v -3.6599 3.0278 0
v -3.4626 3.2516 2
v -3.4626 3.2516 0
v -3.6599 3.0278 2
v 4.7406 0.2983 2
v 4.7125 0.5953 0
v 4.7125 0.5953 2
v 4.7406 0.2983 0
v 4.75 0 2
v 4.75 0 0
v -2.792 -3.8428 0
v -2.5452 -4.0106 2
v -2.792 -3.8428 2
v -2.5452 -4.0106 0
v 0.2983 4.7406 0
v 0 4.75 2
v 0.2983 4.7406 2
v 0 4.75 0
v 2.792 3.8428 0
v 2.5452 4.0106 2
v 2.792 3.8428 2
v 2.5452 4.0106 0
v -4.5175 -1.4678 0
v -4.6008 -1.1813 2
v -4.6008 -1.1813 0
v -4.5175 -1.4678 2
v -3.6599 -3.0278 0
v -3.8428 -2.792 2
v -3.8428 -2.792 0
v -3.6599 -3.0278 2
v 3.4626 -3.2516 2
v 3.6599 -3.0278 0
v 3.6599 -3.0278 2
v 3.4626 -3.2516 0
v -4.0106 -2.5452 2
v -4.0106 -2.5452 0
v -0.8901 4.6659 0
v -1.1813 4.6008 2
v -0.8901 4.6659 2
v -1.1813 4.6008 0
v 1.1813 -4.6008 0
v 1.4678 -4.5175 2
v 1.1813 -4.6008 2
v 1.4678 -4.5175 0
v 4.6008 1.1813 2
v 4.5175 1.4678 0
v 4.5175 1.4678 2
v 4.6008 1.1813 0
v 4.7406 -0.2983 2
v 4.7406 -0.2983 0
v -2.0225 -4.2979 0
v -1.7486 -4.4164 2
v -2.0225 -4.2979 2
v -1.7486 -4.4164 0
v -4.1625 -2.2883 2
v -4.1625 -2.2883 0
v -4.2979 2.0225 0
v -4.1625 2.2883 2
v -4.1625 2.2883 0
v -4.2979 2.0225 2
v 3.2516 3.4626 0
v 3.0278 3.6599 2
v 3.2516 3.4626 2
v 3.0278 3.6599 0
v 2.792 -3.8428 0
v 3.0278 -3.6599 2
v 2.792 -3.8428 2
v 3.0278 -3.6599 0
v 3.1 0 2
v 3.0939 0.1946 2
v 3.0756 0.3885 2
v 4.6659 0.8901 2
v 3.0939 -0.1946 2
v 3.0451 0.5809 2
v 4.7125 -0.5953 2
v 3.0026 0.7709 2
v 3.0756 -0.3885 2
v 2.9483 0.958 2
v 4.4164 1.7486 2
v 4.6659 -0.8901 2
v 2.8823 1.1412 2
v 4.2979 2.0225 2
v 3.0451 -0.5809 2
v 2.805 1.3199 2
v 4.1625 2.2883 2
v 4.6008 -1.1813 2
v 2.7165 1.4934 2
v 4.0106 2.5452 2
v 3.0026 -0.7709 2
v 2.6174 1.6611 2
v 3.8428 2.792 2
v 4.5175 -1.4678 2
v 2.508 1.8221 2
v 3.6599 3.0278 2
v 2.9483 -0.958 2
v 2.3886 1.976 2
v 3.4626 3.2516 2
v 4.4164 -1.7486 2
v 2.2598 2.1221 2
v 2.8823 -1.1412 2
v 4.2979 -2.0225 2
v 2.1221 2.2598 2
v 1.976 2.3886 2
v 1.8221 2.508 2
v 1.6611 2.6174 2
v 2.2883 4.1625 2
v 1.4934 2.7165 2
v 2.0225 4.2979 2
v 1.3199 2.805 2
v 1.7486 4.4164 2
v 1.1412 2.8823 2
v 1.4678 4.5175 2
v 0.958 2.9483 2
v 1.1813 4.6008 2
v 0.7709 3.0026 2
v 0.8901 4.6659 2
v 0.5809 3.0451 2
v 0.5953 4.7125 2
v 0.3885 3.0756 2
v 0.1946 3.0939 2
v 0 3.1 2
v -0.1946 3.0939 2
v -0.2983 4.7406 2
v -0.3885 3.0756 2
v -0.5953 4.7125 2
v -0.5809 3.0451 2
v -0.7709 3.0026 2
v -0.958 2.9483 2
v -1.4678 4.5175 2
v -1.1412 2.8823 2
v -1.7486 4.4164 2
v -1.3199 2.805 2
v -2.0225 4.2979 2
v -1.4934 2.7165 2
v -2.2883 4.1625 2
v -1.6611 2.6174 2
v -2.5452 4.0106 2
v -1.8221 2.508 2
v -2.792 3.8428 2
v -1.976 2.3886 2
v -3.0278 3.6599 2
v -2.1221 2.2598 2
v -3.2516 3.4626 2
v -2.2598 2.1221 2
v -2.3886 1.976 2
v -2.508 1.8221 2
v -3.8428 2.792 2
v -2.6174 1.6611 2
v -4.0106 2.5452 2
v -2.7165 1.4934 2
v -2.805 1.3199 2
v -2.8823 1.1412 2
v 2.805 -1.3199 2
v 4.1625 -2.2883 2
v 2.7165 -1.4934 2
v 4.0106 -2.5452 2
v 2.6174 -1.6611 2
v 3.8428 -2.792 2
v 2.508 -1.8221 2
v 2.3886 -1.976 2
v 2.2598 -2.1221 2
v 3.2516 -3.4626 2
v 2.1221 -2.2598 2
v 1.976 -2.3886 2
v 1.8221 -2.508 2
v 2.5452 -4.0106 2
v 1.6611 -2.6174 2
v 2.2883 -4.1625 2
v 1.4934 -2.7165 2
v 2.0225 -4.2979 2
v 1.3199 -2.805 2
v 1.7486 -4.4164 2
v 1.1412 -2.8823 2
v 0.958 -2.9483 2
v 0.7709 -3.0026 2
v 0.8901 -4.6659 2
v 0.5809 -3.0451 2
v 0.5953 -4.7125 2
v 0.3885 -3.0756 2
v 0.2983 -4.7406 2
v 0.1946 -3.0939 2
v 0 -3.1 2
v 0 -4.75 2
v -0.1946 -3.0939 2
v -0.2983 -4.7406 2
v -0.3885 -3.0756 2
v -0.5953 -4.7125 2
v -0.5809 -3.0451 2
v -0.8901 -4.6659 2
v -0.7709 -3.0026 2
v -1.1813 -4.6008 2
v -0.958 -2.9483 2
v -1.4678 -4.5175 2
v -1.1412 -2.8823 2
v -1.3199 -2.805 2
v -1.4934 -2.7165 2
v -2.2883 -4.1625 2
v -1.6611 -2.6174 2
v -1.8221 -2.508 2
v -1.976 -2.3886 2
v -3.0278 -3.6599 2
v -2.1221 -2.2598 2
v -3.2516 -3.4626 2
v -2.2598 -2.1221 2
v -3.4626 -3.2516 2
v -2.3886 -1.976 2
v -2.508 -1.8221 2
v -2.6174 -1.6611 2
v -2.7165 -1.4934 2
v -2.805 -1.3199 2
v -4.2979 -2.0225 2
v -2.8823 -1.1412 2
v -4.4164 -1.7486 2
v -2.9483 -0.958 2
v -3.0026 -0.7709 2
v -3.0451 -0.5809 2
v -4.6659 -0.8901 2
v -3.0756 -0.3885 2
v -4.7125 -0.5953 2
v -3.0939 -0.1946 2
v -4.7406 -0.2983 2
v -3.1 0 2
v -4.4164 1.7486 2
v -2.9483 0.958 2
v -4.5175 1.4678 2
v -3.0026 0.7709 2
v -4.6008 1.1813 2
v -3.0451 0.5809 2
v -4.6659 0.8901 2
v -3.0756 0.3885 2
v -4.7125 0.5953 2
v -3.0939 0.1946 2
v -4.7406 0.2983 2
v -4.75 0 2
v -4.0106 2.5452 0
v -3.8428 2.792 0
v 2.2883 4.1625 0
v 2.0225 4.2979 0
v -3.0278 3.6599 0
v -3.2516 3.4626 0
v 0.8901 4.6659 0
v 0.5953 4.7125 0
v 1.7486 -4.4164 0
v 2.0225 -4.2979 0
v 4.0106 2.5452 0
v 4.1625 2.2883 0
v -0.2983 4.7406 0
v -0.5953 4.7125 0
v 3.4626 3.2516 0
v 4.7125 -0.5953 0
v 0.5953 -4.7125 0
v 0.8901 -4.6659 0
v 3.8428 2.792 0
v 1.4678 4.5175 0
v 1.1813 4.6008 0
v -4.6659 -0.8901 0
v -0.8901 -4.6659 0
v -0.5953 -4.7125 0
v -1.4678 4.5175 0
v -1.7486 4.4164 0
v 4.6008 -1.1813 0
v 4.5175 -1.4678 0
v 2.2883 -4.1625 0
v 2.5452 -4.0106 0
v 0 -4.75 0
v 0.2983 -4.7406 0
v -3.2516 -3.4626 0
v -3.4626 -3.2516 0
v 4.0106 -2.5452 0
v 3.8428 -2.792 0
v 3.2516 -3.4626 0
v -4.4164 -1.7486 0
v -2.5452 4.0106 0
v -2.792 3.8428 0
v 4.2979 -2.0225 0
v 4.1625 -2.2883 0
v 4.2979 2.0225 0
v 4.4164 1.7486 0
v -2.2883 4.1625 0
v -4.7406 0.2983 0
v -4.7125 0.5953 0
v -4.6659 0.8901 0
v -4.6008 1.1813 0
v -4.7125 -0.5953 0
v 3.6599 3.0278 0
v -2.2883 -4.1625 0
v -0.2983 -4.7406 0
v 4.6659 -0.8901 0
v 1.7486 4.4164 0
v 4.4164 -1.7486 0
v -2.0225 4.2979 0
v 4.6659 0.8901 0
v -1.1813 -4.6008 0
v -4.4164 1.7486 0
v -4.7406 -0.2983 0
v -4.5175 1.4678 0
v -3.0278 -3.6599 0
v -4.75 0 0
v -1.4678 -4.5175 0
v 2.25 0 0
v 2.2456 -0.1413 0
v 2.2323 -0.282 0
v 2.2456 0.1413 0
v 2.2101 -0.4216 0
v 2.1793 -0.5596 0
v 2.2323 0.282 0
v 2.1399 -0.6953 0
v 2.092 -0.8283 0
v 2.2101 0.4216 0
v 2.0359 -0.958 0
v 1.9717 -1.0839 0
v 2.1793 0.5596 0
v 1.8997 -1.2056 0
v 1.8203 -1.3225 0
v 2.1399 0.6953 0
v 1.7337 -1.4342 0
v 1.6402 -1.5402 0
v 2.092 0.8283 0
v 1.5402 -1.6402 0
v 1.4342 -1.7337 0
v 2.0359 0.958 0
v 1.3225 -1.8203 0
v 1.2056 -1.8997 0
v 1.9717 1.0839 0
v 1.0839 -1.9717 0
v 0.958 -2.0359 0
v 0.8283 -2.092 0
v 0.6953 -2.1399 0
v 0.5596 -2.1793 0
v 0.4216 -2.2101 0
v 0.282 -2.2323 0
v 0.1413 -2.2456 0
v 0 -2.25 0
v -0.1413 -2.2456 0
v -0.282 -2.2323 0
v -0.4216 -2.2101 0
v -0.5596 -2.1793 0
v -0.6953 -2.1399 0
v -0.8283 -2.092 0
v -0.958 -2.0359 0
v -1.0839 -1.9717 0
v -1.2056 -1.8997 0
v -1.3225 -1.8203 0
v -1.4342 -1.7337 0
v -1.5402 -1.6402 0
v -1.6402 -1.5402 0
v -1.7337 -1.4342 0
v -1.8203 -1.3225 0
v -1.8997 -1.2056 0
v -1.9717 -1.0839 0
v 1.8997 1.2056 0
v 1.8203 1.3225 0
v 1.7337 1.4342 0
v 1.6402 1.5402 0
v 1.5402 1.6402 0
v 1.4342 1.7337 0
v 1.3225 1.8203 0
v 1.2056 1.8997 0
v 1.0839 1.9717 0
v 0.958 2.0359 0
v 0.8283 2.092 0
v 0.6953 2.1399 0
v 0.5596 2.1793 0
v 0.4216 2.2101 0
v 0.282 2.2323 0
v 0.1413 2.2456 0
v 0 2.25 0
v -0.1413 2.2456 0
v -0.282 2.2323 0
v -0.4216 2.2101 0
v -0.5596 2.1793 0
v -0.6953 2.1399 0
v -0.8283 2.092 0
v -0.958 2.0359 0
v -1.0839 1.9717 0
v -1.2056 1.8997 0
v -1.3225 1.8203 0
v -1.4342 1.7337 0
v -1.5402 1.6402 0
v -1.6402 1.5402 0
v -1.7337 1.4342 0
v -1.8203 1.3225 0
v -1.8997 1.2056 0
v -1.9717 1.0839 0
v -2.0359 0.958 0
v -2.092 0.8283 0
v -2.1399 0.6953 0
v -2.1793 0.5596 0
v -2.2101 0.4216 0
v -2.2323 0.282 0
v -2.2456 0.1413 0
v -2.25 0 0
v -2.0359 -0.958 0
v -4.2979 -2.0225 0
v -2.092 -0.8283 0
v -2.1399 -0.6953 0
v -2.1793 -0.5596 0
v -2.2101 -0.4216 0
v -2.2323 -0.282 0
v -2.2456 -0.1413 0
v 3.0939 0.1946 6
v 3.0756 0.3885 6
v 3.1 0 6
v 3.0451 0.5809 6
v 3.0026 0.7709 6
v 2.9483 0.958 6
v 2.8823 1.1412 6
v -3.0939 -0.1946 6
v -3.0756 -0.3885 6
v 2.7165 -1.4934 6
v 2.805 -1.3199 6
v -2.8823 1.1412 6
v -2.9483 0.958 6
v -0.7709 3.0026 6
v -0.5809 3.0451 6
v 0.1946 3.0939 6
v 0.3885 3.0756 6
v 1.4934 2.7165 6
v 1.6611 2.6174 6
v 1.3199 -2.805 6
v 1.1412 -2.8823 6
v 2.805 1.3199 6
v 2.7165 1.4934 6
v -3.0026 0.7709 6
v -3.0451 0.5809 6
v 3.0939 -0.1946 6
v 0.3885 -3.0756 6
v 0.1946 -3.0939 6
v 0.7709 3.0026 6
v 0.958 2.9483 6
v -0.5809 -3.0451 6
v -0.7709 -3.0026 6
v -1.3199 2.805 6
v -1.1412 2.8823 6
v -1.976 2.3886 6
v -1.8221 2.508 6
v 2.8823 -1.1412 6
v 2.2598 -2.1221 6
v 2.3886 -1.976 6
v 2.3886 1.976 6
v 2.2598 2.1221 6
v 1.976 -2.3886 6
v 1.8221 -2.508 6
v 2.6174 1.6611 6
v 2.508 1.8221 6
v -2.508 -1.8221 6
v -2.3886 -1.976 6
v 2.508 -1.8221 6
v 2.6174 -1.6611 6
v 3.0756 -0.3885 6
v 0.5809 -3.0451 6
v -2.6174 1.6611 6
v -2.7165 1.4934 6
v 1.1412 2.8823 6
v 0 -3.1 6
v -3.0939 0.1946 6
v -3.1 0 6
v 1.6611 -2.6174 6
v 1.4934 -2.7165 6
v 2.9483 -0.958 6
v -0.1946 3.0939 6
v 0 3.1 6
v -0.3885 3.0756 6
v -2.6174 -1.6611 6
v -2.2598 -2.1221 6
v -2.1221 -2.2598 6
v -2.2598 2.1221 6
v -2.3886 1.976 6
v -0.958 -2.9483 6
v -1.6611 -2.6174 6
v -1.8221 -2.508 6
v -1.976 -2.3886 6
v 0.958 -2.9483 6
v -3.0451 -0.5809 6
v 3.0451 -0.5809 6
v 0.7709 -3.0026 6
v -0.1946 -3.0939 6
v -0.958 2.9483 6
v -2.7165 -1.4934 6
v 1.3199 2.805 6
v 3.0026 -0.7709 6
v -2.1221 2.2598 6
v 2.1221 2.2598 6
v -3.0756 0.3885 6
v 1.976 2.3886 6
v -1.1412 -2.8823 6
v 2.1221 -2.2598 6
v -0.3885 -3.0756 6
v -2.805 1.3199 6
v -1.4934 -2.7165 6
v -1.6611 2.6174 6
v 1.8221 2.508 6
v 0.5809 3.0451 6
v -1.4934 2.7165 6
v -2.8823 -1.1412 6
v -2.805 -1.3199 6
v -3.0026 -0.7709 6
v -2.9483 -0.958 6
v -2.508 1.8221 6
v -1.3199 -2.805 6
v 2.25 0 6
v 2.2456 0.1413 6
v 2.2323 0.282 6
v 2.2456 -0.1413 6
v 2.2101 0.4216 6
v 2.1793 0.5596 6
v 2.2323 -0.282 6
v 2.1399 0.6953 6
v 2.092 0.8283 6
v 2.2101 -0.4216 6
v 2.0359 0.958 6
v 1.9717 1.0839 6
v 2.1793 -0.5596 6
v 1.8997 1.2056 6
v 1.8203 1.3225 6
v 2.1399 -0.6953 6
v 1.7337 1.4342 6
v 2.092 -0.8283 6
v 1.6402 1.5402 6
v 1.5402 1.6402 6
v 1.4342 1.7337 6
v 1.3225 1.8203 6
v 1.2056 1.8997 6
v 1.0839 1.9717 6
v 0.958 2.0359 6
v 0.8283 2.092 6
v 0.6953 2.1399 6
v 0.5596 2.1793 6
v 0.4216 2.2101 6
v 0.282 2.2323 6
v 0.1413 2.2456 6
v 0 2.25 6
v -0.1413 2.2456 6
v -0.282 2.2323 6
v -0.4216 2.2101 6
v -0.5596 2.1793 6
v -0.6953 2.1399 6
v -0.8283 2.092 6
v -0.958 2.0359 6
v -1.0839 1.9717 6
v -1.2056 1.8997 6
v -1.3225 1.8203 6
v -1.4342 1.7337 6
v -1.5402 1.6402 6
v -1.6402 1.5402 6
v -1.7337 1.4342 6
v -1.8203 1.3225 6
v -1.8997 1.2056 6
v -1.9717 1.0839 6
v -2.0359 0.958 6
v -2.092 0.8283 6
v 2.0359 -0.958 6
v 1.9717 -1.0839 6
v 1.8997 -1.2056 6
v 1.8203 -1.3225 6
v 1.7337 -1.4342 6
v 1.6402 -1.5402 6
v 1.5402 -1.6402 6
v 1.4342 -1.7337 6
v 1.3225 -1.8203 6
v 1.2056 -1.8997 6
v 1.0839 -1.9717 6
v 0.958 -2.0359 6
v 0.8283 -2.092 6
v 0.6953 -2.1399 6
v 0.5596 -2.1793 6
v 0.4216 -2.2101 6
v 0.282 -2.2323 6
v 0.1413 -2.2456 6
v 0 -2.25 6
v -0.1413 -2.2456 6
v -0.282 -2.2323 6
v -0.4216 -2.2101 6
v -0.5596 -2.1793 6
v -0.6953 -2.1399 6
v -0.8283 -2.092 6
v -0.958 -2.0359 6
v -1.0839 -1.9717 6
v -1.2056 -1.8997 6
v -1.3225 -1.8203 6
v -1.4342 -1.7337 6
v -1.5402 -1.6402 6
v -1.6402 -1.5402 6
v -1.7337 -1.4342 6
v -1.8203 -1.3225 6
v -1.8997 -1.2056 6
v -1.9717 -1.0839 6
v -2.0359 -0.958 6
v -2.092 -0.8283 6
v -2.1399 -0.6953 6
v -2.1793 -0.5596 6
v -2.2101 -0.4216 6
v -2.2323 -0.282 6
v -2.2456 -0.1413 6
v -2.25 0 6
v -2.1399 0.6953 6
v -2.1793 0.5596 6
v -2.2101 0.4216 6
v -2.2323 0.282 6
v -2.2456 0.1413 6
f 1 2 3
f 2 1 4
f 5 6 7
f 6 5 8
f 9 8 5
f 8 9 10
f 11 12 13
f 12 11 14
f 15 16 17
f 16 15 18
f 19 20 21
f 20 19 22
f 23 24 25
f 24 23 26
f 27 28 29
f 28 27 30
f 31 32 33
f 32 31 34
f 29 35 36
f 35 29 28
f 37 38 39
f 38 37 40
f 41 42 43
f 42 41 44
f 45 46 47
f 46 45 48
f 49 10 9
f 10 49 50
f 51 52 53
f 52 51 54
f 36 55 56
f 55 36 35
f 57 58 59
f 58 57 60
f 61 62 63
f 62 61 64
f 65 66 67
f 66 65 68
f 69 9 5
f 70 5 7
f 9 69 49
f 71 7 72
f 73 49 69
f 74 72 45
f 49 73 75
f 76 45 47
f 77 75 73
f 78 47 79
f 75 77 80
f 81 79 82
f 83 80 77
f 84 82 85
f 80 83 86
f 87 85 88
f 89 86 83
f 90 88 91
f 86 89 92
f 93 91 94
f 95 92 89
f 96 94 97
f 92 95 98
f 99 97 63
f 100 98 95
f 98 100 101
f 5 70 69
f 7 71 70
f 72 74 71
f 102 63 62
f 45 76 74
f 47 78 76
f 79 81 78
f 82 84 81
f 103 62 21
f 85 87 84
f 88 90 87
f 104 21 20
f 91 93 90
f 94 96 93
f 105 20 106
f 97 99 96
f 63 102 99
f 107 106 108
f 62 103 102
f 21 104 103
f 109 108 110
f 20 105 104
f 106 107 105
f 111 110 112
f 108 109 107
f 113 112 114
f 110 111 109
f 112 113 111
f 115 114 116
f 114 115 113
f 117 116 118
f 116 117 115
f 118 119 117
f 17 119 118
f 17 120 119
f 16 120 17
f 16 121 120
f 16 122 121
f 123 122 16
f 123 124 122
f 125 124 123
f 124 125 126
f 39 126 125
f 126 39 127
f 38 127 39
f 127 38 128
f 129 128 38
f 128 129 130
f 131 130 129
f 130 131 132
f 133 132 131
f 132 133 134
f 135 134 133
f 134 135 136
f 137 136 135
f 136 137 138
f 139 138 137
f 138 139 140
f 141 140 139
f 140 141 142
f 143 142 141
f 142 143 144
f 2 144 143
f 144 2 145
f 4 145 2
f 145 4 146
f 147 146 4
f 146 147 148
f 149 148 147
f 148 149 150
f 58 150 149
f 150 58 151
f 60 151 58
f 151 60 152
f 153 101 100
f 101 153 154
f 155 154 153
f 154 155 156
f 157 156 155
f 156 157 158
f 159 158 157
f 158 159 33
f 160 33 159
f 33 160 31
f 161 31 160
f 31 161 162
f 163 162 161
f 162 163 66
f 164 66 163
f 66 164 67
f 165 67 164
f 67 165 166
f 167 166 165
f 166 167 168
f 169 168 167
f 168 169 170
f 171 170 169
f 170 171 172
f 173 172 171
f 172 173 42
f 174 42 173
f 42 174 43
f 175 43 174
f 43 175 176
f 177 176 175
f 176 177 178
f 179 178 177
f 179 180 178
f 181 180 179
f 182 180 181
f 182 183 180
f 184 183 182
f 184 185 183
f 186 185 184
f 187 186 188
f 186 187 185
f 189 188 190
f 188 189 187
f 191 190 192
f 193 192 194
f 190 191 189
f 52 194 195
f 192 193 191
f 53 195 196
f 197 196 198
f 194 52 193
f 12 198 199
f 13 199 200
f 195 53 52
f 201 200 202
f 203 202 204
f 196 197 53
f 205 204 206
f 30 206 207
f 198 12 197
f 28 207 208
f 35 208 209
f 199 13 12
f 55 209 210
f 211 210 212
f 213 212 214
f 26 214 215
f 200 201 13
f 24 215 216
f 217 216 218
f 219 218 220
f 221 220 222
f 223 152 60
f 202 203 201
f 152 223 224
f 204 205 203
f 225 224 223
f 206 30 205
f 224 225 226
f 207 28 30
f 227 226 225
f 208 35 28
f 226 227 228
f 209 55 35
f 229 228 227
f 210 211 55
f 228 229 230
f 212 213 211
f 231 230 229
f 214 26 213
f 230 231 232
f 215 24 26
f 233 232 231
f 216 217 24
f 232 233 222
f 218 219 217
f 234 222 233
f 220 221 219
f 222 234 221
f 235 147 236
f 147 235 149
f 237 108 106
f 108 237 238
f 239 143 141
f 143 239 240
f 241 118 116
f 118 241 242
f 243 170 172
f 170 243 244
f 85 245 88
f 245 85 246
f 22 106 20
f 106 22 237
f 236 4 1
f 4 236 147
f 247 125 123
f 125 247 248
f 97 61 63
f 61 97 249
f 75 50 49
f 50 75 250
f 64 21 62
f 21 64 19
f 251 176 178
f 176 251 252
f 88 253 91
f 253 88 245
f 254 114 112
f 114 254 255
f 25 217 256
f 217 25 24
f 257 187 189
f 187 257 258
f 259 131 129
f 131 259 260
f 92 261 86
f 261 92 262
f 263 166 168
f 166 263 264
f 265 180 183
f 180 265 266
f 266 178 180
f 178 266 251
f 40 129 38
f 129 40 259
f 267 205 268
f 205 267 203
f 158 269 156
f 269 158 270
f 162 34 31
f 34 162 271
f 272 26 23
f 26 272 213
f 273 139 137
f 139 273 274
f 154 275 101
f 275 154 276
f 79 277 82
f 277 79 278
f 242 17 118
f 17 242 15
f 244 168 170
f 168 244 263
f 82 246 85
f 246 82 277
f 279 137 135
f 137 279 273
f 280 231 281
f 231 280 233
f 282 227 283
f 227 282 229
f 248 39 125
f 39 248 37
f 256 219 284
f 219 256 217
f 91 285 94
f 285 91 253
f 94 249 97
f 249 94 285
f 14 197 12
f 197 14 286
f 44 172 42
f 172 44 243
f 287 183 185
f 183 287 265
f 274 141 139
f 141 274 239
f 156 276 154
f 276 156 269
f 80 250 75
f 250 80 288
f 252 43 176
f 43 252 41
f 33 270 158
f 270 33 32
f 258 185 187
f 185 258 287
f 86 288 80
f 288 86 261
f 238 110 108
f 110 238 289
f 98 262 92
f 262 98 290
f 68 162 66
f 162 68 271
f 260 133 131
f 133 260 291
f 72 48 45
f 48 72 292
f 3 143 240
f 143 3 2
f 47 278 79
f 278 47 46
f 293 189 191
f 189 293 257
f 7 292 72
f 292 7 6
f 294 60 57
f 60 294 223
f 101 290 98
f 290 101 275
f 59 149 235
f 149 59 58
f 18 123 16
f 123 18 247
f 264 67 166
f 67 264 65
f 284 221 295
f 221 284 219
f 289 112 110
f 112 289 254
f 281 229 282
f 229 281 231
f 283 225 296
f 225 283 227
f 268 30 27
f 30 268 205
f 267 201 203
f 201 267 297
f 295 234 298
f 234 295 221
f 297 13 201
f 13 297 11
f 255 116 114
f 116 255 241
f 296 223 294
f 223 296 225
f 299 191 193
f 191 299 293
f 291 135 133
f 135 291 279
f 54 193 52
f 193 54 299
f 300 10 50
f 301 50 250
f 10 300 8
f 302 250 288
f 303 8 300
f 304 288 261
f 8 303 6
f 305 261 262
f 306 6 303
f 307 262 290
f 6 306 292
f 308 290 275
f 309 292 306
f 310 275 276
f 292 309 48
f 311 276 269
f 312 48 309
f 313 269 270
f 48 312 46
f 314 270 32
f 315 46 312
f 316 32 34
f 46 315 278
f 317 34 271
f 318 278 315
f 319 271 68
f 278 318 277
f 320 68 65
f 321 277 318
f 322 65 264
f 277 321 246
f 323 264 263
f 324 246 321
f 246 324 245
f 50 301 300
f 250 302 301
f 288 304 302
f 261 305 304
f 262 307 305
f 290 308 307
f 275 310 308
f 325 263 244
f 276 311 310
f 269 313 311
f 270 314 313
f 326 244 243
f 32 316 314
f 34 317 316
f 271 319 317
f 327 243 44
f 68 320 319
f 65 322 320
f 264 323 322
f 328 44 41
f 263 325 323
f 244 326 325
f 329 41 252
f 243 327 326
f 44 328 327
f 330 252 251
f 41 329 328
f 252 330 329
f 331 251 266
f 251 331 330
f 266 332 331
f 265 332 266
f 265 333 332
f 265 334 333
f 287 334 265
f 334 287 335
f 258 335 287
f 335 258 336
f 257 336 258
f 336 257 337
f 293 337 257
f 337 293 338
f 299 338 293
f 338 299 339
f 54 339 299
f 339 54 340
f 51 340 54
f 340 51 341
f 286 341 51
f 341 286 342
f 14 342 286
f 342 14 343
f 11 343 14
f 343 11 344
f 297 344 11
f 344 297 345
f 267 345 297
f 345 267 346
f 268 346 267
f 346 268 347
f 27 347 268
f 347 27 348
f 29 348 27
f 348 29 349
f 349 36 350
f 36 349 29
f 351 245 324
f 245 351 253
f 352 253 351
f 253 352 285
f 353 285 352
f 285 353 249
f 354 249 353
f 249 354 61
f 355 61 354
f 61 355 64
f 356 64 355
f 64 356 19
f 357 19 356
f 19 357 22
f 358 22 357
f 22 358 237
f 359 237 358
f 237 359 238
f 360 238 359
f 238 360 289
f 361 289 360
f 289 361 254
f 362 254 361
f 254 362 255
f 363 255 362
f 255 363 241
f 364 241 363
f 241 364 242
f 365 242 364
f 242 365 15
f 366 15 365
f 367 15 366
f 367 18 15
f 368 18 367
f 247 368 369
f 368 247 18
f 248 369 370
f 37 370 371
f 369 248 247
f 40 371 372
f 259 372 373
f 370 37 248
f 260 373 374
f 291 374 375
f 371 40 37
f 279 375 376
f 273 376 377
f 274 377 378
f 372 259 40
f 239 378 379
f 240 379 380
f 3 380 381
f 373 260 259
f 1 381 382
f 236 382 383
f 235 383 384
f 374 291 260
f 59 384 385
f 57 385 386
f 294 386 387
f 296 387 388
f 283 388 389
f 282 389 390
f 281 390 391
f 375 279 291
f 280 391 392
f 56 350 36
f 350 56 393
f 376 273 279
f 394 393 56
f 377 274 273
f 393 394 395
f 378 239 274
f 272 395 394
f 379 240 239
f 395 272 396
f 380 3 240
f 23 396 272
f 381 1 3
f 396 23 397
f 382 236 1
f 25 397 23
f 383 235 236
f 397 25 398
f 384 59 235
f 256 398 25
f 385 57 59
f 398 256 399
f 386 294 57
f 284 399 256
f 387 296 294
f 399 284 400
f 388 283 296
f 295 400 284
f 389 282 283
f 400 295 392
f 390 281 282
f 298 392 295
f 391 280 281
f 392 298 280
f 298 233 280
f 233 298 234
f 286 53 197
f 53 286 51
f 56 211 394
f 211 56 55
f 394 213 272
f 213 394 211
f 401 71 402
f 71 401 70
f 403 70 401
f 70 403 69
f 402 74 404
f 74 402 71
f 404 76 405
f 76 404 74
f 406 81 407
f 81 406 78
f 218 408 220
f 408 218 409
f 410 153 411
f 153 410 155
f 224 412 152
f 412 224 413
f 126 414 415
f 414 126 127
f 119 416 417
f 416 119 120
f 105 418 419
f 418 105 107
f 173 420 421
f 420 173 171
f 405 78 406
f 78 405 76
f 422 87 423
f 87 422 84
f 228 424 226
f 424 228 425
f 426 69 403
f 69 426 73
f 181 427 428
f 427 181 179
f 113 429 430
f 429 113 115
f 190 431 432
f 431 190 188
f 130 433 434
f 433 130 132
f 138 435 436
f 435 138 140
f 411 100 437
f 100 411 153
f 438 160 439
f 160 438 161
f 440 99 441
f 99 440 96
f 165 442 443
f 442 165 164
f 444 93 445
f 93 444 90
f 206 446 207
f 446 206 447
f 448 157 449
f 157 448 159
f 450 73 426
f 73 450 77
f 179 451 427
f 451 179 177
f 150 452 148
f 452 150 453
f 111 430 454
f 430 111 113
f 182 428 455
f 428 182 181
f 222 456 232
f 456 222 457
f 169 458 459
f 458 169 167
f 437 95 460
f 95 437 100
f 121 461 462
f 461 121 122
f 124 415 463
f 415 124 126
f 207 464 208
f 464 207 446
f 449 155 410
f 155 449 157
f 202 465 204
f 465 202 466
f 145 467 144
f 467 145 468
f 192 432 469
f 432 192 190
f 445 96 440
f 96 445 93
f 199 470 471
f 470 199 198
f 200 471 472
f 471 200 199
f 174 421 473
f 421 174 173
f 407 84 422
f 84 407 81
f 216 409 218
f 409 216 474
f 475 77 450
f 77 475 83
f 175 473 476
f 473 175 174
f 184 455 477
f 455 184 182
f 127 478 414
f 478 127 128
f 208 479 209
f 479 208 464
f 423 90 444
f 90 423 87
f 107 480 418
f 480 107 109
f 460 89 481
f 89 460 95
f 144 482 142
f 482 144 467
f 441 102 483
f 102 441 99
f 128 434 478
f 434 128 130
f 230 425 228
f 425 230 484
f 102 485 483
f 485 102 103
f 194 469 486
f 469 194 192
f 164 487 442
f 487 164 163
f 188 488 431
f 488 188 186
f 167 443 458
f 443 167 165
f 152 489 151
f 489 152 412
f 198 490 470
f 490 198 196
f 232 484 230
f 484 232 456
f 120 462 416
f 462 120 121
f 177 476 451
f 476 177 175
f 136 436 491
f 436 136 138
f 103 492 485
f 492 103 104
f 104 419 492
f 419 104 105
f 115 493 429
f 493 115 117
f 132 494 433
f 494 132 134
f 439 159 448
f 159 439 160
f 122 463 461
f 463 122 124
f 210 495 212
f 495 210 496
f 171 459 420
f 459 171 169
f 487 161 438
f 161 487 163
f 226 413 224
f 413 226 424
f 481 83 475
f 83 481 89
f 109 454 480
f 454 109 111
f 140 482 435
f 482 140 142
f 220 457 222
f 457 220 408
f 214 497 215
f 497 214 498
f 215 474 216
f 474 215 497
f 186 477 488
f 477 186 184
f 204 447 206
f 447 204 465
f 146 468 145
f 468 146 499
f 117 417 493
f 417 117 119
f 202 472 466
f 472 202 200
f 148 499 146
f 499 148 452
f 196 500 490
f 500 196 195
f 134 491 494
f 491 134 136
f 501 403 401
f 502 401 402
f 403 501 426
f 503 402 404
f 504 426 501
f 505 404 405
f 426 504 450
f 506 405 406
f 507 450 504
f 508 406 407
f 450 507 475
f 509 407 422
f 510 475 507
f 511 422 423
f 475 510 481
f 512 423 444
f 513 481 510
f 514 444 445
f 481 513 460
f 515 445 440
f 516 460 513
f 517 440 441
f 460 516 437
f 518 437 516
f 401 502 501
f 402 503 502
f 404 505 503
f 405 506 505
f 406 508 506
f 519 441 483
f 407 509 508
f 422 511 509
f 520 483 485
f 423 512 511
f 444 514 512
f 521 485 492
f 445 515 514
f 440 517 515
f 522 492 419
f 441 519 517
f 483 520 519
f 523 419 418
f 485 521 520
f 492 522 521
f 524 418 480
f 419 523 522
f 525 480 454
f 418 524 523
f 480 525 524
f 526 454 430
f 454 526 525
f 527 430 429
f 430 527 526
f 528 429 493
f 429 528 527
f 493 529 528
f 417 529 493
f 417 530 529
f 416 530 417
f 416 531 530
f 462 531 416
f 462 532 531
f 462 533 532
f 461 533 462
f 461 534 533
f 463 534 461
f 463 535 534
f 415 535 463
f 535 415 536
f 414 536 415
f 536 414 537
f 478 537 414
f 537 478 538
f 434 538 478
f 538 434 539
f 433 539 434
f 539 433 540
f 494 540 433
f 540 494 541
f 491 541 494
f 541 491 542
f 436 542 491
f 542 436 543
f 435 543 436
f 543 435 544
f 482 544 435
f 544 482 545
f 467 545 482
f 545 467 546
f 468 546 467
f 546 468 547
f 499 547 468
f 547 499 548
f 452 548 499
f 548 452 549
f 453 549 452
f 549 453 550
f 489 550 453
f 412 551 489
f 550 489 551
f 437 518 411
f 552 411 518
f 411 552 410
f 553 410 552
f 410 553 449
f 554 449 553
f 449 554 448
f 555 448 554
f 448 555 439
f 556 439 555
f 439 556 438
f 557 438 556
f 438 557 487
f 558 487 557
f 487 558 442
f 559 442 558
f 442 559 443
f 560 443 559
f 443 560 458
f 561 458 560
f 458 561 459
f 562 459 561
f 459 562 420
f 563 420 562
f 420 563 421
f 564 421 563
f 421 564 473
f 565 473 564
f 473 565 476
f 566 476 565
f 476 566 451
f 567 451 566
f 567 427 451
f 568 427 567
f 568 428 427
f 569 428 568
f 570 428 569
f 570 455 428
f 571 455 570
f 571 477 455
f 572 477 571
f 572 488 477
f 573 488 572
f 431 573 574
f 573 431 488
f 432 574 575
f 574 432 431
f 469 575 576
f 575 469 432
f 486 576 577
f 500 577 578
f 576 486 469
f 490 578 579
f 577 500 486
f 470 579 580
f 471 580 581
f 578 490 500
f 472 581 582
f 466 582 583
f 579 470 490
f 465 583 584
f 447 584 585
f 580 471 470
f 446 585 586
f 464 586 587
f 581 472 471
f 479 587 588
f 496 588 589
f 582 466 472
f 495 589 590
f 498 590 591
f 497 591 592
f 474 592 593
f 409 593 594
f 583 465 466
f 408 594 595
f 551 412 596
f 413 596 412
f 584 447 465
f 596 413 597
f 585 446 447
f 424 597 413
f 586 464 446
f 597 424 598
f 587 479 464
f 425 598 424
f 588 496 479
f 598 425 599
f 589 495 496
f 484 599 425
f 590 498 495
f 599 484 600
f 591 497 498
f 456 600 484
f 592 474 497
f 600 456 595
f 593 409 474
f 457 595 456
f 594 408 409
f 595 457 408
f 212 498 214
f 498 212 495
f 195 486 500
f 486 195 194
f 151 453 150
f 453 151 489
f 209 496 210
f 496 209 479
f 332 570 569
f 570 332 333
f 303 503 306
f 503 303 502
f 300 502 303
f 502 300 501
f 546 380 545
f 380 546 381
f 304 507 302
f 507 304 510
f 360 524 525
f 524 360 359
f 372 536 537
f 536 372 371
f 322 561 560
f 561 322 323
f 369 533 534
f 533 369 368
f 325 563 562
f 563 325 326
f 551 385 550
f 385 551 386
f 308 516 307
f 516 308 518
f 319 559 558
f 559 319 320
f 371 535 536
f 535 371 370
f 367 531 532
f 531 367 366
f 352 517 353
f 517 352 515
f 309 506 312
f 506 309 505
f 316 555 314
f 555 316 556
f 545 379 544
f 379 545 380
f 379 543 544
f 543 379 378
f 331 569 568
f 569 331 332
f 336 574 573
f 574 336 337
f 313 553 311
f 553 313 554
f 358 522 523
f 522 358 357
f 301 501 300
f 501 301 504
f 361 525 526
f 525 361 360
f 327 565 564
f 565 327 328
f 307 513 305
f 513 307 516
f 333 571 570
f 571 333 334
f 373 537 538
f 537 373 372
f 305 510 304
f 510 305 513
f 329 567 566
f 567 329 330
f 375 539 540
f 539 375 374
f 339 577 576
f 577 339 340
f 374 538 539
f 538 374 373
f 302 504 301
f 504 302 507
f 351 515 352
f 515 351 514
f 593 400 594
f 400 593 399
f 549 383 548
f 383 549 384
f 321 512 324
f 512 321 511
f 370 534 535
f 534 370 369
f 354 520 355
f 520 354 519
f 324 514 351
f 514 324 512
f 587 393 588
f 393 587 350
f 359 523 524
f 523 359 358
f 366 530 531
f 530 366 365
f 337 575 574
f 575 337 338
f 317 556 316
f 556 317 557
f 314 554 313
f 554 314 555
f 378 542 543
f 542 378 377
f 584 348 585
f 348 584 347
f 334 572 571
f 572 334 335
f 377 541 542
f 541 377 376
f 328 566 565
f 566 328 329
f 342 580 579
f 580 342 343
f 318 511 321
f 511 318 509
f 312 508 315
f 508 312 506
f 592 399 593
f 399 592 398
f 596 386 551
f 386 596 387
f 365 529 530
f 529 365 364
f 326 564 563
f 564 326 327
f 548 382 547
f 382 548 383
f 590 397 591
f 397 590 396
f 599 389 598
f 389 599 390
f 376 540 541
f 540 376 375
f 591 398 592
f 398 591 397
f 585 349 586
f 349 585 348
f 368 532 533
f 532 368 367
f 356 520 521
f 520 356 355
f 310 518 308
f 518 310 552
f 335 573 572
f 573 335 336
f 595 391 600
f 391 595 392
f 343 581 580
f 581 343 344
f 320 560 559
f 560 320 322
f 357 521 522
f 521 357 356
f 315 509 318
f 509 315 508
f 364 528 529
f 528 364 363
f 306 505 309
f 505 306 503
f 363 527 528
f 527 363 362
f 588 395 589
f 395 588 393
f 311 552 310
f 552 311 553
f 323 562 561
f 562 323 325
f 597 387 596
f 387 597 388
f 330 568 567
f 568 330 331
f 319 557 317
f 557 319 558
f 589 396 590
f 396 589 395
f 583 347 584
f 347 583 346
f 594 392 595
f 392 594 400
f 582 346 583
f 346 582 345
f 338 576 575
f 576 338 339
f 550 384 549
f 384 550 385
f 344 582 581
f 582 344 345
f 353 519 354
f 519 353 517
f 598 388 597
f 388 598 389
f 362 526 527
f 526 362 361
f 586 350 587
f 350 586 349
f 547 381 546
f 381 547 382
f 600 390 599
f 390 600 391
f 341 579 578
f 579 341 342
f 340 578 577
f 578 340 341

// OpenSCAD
resolution = 100;

module part1() {
difference () {
union() {
    cylinder (r=9.5/2,h=2, $fn=resolution);
    cylinder (r=6.2/2,h=6, $fn=resolution);
}
cylinder (r=4.5/2,h=8, $fn=resolution);
//translate ([0,0,6]) cylinder (r1=4/2, r2=8/2, h=2, $fn=resolution);
}
}


module part2() {
difference () {
cylinder (r=9.5/2,h=2, $fn=resolution);
cylinder (r=4.5/2,h=8, $fn=resolution);
translate ([0,0,0]) cylinder (r1=4.5/2, r2=8/2, h=2, $fn=resolution);
}
}

part1();

//////////////////
/*module but () {cylinder (r=9.5/2,h=2, $fn=resolution);

cylinder (r=6.2/2,h=8/2, $fn=resolution);
}


difference () {
but();
cylinder (r=4/2,h=8, $fn=resolution);
}*/
